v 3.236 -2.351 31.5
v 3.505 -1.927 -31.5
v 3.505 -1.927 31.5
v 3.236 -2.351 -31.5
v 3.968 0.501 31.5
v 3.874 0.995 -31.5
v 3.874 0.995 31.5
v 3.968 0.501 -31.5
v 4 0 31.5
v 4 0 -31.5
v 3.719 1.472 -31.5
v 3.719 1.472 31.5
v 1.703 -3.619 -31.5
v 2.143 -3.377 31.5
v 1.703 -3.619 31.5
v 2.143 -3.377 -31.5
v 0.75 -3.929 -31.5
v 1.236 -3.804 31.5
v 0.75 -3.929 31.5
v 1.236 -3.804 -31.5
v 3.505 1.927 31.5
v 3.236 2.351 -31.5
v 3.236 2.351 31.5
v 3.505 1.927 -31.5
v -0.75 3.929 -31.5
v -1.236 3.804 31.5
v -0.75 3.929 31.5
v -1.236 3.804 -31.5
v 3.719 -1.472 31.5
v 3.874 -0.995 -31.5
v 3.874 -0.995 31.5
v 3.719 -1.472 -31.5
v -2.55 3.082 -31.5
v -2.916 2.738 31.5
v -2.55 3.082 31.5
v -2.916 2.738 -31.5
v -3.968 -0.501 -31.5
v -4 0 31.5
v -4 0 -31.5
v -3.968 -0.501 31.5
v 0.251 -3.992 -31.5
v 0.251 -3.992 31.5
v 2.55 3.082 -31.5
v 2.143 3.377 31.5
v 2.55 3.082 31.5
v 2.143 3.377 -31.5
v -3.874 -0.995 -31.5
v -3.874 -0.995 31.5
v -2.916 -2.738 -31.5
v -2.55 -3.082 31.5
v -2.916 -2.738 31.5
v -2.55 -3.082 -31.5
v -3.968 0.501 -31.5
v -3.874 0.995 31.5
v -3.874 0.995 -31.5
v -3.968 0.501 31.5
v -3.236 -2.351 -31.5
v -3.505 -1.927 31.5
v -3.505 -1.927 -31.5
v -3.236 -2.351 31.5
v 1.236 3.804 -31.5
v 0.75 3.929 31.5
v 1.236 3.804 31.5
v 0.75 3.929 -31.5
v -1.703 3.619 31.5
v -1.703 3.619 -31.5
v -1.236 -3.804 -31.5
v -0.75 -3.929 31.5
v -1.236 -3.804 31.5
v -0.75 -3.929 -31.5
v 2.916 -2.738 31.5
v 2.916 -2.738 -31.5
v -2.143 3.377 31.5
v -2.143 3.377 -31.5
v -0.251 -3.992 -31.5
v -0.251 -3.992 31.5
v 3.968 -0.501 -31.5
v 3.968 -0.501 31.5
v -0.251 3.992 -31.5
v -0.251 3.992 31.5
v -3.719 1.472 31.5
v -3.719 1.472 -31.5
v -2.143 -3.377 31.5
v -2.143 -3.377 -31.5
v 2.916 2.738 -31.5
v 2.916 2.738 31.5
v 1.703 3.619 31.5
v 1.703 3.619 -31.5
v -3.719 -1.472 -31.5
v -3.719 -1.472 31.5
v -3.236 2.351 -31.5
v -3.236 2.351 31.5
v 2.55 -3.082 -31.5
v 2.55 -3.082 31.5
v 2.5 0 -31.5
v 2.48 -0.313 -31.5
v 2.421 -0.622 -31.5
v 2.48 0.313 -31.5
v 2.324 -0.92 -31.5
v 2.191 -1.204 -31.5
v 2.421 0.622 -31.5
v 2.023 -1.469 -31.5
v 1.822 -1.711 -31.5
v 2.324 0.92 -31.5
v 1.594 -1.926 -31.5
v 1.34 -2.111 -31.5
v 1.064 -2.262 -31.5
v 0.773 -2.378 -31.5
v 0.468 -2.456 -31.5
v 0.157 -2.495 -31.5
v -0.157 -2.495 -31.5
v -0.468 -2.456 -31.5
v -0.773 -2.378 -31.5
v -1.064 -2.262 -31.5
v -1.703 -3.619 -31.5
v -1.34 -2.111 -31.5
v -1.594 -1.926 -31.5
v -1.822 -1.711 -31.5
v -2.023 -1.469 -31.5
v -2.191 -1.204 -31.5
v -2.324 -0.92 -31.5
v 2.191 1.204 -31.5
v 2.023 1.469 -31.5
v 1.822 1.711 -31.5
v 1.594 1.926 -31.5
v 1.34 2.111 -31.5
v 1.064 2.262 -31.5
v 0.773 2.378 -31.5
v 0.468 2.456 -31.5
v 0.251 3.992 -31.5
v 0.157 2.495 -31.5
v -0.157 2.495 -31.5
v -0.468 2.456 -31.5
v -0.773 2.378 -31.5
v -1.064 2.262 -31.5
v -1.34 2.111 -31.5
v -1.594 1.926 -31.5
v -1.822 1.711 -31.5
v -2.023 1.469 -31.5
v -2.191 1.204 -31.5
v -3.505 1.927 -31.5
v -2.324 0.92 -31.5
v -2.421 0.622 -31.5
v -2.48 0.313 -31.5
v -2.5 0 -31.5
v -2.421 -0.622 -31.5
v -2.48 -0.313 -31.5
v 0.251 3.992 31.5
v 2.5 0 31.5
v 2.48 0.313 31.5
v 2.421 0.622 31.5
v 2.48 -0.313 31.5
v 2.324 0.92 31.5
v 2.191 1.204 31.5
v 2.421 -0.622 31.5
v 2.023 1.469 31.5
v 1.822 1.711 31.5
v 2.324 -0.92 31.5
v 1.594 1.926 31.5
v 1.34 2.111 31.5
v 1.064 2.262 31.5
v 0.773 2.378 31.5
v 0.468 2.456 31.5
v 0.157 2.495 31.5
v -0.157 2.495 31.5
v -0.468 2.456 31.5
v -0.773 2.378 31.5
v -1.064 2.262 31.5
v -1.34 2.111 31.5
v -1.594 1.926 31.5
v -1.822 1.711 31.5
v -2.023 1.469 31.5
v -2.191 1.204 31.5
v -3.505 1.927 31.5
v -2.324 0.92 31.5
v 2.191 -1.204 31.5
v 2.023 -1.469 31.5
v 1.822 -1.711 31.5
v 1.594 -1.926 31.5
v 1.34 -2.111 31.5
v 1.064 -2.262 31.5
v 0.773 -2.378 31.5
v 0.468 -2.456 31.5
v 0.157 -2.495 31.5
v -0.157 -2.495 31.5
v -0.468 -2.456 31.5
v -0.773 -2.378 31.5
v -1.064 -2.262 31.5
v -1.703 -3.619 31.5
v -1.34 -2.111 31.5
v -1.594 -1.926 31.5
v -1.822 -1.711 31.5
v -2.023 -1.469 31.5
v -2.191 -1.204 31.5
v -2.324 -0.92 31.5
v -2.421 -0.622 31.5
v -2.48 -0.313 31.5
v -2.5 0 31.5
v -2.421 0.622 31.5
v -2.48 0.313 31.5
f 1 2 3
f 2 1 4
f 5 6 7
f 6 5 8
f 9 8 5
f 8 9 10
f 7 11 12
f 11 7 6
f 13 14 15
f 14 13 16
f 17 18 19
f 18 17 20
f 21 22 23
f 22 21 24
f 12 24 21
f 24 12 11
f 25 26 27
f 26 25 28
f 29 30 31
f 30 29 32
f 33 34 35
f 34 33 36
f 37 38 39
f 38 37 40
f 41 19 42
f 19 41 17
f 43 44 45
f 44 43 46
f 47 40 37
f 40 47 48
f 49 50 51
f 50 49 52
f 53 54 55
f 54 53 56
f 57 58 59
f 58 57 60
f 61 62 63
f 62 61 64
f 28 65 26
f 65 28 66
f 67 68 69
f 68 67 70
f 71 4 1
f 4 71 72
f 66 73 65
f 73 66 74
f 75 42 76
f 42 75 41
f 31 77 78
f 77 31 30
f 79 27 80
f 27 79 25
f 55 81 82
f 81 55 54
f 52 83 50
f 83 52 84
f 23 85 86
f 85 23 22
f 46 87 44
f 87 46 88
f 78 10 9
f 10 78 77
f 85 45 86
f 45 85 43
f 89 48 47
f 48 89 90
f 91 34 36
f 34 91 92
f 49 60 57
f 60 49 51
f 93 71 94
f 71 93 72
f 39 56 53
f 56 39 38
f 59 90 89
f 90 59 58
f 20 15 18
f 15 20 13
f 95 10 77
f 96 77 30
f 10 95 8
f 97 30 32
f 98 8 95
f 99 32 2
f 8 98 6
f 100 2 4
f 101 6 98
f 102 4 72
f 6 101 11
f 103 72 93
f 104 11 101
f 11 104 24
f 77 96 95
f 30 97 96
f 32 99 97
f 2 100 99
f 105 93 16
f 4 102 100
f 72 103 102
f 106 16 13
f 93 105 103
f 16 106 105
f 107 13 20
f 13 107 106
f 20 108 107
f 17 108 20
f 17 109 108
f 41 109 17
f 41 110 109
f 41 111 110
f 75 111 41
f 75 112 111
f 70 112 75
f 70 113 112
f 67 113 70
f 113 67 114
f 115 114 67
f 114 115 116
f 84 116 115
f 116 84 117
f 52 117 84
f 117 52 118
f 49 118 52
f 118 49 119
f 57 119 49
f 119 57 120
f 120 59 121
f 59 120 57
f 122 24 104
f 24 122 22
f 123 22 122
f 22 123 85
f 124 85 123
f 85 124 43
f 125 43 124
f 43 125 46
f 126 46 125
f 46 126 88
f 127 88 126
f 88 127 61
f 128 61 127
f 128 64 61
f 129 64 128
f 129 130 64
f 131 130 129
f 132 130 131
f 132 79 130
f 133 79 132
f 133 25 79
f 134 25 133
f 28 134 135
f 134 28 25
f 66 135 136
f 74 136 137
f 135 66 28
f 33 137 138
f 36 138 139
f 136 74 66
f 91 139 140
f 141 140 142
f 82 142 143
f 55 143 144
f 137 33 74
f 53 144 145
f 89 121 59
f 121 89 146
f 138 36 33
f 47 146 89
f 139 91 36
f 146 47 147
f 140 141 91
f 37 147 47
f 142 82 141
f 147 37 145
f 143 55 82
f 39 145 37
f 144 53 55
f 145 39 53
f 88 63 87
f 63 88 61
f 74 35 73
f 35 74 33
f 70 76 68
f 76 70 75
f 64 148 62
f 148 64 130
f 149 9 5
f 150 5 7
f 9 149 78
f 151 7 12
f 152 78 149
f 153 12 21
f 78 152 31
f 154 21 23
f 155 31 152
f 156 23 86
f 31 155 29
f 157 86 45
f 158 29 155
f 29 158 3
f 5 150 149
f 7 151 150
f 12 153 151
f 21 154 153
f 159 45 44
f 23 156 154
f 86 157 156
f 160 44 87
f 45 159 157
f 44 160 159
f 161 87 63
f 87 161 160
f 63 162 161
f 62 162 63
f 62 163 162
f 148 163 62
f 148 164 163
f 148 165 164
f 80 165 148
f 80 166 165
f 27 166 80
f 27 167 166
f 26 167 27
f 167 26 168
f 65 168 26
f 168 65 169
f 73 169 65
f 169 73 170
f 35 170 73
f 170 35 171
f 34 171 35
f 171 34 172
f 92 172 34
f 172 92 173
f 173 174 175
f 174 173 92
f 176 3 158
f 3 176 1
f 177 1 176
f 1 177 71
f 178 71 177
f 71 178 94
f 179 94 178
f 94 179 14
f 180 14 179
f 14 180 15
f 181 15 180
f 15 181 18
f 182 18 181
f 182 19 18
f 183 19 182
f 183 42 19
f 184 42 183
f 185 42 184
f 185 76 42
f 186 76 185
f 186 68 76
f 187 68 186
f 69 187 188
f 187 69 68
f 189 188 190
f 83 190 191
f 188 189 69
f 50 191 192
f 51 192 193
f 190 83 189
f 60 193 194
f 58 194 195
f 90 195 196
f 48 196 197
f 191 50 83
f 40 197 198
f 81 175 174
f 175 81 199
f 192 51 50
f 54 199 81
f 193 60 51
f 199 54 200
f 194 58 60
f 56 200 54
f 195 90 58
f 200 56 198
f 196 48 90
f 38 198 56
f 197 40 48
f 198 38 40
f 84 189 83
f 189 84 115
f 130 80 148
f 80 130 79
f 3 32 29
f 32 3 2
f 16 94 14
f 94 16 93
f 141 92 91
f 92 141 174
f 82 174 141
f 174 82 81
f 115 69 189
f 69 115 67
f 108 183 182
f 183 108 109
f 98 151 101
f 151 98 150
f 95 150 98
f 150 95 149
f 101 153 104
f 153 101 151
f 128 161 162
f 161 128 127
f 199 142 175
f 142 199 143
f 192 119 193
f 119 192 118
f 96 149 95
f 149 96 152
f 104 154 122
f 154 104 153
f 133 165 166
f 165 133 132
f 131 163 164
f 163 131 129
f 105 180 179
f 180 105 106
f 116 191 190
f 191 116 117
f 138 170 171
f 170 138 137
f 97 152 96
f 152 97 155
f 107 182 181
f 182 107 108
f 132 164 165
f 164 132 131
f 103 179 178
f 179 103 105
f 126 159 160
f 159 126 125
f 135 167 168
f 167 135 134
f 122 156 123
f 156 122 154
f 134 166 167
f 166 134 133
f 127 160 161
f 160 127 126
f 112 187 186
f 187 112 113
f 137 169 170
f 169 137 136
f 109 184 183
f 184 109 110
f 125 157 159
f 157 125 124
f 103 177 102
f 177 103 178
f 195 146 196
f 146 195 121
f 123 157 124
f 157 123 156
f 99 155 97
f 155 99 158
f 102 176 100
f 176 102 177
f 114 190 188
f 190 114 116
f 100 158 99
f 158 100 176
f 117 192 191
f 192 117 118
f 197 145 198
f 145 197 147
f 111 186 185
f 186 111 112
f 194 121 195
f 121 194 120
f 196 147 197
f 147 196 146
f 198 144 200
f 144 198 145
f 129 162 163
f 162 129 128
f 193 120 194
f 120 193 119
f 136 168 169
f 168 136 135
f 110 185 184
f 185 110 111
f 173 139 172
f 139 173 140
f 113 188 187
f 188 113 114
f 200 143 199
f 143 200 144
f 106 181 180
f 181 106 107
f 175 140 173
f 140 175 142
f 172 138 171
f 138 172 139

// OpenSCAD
$fn = 50;


difference() {
	union() {
		translate(v = [0, 0, -31.5000000000]) {
			cylinder(h = 63, r = 4.0000000000);
		}
	}
	union() {
		translate(v = [0, 0, -100.0000000000]) {
			cylinder(h = 200, r = 2.5000000000);
		}
	}
}
